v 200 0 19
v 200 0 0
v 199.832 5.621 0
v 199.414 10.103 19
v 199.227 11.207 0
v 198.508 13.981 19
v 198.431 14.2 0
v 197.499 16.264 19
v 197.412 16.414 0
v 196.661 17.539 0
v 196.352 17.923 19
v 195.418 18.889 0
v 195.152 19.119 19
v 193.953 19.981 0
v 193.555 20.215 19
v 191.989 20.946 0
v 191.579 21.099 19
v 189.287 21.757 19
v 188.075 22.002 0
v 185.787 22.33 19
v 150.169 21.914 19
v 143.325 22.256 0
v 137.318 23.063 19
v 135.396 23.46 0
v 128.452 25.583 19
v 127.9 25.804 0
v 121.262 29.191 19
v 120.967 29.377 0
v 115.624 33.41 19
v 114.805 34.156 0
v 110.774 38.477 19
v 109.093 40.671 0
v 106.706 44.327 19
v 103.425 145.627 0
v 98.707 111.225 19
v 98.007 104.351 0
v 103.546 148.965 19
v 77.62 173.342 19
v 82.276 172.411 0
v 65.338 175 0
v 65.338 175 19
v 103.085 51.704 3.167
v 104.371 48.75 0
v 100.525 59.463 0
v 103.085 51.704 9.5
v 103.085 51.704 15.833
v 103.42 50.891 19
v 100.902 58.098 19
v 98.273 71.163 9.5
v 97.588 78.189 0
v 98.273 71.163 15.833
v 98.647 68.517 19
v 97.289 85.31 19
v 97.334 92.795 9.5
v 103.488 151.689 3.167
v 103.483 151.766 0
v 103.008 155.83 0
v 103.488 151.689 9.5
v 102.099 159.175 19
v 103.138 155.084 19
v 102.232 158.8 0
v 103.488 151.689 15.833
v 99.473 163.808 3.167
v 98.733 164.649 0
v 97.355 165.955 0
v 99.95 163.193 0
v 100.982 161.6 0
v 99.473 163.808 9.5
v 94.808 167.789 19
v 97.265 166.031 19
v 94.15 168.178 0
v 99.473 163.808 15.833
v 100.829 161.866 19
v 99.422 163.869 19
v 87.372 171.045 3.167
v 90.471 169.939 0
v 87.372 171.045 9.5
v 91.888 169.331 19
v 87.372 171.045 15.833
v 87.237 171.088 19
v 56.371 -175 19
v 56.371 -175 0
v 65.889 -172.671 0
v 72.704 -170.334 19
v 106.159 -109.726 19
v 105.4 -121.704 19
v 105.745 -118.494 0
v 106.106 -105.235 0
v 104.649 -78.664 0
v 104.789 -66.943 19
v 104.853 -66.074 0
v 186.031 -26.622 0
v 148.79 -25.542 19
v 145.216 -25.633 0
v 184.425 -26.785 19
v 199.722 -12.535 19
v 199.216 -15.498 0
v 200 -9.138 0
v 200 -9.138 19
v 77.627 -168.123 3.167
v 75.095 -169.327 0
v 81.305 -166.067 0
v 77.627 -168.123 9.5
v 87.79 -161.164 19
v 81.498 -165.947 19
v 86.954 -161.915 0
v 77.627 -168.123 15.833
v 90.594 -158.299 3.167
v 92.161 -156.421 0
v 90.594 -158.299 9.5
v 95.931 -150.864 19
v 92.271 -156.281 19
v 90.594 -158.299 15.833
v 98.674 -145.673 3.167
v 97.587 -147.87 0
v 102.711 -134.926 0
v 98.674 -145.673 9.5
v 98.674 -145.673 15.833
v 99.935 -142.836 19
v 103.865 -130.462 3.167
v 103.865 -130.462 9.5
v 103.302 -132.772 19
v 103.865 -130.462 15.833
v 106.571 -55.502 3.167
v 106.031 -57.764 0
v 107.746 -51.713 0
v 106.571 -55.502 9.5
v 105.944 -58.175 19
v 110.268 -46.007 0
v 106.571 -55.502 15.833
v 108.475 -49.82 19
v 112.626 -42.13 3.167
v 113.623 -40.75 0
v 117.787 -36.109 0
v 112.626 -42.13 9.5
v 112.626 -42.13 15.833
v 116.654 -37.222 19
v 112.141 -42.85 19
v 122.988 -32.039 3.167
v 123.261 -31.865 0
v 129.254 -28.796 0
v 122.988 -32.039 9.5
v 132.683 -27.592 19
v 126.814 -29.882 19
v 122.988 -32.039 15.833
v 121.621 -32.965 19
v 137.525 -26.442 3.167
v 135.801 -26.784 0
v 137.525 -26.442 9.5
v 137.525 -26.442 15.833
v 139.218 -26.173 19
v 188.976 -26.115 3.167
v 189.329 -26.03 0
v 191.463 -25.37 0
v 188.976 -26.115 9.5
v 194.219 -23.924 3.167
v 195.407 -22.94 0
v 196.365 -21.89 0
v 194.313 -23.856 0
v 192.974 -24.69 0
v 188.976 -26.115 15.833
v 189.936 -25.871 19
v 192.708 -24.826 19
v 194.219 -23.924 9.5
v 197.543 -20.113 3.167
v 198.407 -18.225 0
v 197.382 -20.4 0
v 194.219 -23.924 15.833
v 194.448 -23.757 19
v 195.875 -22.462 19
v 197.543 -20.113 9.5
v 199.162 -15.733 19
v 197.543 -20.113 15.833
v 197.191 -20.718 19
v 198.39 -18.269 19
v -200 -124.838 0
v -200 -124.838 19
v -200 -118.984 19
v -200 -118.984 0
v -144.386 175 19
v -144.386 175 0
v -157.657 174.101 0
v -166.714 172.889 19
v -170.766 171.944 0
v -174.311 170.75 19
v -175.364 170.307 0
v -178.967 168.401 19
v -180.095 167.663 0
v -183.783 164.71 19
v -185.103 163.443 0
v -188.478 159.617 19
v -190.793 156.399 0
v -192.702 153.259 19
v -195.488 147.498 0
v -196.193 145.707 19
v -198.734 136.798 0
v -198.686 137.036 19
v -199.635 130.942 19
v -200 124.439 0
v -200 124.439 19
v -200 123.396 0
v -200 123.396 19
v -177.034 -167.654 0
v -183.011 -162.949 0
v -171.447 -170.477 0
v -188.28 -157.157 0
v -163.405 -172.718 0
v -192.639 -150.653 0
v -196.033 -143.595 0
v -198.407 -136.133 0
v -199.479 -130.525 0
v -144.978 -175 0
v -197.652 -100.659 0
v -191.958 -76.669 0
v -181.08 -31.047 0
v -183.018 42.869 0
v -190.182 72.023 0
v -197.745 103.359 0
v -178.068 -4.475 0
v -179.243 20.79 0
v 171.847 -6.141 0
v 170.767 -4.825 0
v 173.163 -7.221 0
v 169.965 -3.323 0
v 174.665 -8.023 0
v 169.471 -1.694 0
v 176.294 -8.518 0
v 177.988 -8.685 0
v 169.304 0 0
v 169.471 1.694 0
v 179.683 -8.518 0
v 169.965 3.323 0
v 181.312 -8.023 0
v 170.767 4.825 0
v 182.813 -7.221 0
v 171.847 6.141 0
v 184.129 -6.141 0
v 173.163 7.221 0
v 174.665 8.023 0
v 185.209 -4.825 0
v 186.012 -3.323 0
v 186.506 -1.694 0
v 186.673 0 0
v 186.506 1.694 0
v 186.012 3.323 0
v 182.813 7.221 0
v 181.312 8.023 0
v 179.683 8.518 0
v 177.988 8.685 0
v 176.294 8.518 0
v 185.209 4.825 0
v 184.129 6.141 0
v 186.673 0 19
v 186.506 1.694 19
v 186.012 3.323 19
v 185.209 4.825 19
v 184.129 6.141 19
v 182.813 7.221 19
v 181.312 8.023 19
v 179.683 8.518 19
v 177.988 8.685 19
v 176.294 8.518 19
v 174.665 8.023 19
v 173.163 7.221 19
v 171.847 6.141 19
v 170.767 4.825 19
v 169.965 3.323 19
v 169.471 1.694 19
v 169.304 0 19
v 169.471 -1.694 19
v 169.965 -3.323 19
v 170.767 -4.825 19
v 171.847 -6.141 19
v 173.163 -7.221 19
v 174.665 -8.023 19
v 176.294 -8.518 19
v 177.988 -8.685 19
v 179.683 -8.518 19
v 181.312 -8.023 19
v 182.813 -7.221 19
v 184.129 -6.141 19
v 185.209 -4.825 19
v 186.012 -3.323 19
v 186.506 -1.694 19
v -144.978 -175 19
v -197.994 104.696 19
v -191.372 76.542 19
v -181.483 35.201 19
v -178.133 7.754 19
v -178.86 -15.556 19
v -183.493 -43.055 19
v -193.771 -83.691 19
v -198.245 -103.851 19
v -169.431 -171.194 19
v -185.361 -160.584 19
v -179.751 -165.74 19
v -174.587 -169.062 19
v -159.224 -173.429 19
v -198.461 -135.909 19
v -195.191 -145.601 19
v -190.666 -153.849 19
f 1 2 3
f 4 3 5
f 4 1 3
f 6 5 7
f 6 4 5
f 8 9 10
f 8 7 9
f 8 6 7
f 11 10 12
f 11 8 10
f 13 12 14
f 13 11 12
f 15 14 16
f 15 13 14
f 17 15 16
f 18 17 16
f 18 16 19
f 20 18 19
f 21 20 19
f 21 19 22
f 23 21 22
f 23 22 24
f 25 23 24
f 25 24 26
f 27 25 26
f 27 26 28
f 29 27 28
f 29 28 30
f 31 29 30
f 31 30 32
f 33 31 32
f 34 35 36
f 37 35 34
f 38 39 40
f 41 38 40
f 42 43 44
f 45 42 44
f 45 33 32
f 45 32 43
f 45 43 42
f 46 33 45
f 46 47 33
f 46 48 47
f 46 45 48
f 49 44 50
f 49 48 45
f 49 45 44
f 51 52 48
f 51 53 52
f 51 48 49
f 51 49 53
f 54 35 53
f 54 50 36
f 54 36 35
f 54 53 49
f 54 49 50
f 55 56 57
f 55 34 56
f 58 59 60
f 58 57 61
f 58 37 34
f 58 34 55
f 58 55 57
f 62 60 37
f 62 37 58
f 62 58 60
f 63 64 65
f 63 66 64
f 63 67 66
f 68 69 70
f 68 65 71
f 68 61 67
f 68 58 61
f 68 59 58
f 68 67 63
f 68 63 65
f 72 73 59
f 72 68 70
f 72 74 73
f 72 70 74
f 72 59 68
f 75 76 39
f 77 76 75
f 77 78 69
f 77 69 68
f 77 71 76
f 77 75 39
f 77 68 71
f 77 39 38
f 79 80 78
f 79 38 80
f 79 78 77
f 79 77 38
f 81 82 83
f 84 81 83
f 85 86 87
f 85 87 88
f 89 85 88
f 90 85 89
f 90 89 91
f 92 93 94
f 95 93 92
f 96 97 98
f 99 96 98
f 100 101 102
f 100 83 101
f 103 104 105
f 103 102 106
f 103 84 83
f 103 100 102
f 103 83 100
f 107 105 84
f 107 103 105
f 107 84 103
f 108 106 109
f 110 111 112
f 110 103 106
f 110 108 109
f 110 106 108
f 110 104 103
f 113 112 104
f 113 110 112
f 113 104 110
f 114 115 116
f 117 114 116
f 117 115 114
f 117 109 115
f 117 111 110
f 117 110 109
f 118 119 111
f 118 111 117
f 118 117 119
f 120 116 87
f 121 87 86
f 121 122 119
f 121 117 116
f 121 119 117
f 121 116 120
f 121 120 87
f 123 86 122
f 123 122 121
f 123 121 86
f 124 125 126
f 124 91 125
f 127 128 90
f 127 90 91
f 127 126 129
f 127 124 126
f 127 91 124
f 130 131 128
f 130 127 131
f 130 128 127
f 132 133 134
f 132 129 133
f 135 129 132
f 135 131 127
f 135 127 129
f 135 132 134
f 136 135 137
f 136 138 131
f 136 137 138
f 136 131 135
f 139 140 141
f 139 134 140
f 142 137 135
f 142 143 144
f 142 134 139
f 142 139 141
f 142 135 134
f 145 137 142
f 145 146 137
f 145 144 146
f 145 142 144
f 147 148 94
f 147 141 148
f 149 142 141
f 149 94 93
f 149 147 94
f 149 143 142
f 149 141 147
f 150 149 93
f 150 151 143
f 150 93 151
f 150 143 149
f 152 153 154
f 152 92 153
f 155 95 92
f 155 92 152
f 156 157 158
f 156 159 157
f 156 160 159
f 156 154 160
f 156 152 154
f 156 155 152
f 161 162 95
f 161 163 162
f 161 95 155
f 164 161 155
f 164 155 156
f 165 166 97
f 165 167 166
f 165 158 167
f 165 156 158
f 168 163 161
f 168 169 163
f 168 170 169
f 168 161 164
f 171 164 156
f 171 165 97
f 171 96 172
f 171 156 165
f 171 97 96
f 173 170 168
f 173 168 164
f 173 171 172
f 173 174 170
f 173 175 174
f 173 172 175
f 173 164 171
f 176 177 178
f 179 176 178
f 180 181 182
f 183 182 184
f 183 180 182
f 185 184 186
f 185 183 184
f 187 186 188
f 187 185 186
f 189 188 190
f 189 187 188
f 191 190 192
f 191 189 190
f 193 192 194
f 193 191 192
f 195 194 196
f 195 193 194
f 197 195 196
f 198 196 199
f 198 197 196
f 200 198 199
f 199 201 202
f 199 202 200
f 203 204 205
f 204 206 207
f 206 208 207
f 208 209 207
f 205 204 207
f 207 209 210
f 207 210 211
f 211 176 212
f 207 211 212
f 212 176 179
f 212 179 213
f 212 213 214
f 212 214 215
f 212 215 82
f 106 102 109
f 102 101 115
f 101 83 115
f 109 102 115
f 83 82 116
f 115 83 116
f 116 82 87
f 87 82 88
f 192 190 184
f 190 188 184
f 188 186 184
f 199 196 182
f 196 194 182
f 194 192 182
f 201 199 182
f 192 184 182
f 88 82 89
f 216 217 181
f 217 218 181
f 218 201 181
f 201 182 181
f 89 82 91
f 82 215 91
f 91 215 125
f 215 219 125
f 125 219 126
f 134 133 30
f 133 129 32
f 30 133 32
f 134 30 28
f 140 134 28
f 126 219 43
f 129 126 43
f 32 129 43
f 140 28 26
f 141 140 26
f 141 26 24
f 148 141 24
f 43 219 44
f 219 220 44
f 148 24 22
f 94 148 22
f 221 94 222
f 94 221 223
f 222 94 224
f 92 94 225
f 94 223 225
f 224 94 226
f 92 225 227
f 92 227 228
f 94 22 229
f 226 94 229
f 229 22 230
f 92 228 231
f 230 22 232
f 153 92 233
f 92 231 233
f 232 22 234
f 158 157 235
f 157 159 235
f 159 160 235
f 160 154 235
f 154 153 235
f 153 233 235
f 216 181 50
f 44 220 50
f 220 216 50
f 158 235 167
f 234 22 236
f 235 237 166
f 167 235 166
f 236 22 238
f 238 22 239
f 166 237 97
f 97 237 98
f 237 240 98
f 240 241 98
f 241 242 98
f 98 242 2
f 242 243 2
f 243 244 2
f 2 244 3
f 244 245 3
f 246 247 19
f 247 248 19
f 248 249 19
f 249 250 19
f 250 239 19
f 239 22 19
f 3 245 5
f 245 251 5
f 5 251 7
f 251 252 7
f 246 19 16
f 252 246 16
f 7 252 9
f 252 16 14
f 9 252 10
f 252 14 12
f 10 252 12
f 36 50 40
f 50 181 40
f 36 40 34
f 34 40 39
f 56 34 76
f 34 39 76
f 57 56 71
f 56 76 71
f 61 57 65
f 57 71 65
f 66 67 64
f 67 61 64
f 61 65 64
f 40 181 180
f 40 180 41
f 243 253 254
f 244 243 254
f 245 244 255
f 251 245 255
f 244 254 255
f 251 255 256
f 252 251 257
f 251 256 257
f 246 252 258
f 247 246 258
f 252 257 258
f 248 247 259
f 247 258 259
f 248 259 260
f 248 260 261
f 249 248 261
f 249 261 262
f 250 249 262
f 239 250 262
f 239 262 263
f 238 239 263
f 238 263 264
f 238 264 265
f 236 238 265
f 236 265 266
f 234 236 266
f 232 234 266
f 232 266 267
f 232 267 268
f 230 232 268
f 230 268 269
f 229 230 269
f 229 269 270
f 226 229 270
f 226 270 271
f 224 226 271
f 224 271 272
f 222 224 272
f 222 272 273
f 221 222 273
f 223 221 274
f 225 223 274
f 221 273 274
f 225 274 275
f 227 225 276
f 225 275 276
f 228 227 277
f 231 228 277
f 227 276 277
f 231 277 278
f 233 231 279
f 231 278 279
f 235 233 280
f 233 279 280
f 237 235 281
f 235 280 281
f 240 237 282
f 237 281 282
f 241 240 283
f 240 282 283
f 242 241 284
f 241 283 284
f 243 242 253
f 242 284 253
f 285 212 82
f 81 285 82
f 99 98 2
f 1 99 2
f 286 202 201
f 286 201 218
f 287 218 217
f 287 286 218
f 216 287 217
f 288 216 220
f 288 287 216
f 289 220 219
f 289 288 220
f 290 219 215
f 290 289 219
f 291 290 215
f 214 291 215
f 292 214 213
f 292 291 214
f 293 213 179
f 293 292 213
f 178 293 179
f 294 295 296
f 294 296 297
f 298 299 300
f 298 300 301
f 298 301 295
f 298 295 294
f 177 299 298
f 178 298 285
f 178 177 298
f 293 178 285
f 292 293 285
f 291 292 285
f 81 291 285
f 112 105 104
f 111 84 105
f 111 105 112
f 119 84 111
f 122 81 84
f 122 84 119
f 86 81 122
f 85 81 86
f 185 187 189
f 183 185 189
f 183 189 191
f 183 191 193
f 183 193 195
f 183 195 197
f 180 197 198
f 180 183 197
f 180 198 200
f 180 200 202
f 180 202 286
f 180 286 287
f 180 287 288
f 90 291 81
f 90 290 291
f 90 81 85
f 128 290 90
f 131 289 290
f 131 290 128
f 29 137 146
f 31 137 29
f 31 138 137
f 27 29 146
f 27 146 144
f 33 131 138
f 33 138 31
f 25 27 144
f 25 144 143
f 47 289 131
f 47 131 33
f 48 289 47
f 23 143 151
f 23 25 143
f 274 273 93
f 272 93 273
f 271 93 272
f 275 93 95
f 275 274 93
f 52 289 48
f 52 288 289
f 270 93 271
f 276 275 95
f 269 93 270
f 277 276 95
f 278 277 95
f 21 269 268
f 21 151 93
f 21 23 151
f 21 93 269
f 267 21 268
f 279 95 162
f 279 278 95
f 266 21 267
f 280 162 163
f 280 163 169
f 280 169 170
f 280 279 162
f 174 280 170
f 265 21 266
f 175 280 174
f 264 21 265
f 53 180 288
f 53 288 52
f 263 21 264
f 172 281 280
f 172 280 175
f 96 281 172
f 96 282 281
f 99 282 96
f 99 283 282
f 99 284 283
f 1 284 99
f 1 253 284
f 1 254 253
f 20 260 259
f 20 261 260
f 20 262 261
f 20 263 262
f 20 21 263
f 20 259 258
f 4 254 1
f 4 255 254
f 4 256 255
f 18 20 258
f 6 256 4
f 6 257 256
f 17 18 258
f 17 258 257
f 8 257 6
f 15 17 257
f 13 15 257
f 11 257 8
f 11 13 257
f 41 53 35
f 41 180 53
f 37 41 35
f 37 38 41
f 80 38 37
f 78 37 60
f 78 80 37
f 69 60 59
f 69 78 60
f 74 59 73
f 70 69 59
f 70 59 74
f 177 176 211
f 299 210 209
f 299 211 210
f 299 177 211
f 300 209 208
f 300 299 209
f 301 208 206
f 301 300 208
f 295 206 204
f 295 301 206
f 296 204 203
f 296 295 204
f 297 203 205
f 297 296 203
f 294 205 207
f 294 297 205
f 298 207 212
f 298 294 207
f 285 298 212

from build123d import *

# Parameters (mm, degrees)
F0_W     = 400
F0_H     = 350
F1_DEPTH = 19
F3_DEPTH = 19.001
F2_R     = 8.68454191
F4_DEPTH = 19.0010001


with BuildPart() as f1:
    # F0 (on Top) → F1 (new body)
    with BuildSketch(Plane.XY):
        Rectangle(F0_W, F0_H)
    extrude(amount=F1_DEPTH)

    # F2 (on face) → F3 (cut, through all)
    with BuildSketch(Plane.XY.offset(19)):
        with BuildLine():
            add(Edge.make_bspline(
                [(-144.3863546874, 175), (-165.2329227667, 173.8789118896), (-183.9453143709, 171.6209800037), (-199.8558619747, 143.6633605964), (-200, 124.4392270745)],
                knots=[0, 0, 0, 0, 0.0401734108, 0.0829469806, 0.0829469806, 0.0829469806, 0.0829469806], degree=3))
            Line((-144.3863546874, 175), (-200, 175))
            Line((-200, 175), (-200, 124.4392270744))
        make_face()
        with BuildLine():
            Line((200, 175), (65.338462454, 175))
            add(Edge.make_bspline(
                [(200, 0), (199.8166252336, 8.7814322248), (199.690280281, 29.6175777687), (133.7661003093, 14.0792968746), (95.3001860897, 49.1740114485), (96.8460076147, 114.6655377081), (109.6455904435, 164.8260868327), (87.5146063822, 172.6839667365), (65.3384624538, 175)],
                knots=[0.6532504807, 0.6532504807, 0.6532504807, 0.6532504807, 0.682714225, 0.7303179586, 0.7734504511, 0.8248457927, 0.8670015807, 0.907356403, 0.907356403, 0.907356403, 0.907356403], degree=3))
            Line((200, 0), (200, 175))
        make_face()
        with BuildLine():
            add(Edge.make_bspline(
                [(-200, 123.3958447292), (-199.7619832828, 91.134165718), (-156.6971429924, 2.4618160265), (-198.7318065847, -87.3217052913), (-200, -118.9837975818)],
                knots=[0.0837173627, 0.0837173627, 0.0837173627, 0.0837173627, 0.1548619144, 0.2226071343, 0.2226071343, 0.2226071343, 0.2226071343], degree=3))
            Line((-200, 123.3958447292), (-200, -118.9837975818))
        make_face()
        with BuildLine():
            add(Edge.make_bspline(
                [(200, -9.1380018675), (200.142398823, -6.1481129118), (200.0631818853, -3.0256477166), (200, 0)],
                knots=[0.6430987301, 0.6430987301, 0.6430987301, 0.6430987301, 0.6532504807, 0.6532504807, 0.6532504807, 0.6532504807], degree=3))
            Line((200, 0), (200, -9.1380018675))
        make_face()
        with BuildLine():
            Line((200, -175), (200, -9.1380018675))
            add(Edge.make_bspline(
                [(56.3706645187, -175), (79.7924420672, -170.2752995484), (98.643784219, -154.1310296062), (110.0260803826, -110.4234542848), (98.5130759268, -54.0890321848), (132.8248140208, -16.3029922353), (195.4041142771, -34.2470777838), (199.6919924438, -15.6051086243), (200, -9.1380018675)],
                knots=[0.3993161169, 0.3993161169, 0.3993161169, 0.3993161169, 0.4430674241, 0.484052229, 0.5315493208, 0.5730877454, 0.6211405717, 0.6430987301, 0.6430987301, 0.6430987301, 0.6430987301], degree=3))
            Line((56.3706645187, -175), (200, -175))
        make_face()
        with BuildLine():
            add(Edge.make_bspline(
                [(-200, -124.838407108), (-199.1662539063, -143.8263247885), (-181.0409866029, -170.2546743415), (-164.3555968809, -173.2601982495), (-144.9777763545, -175)],
                knots=[0.2268886078, 0.2268886078, 0.2268886078, 0.2268886078, 0.2696536718, 0.3085414567, 0.3085414567, 0.3085414567, 0.3085414567], degree=3))
            Line((-200, -124.8384071079), (-200, -175))
            Line((-200, -175), (-144.9777763545, -175))
        make_face()
    extrude(amount=-F3_DEPTH, mode=Mode.SUBTRACT)

    # F2 (on face) → F4 (cut, through all)
    with BuildSketch(Plane.XY.offset(19)):
        with Locations((177.9883056879, 0)):
            Circle(F2_R)
    extrude(amount=-F4_DEPTH, mode=Mode.SUBTRACT)


solid = f1.part
